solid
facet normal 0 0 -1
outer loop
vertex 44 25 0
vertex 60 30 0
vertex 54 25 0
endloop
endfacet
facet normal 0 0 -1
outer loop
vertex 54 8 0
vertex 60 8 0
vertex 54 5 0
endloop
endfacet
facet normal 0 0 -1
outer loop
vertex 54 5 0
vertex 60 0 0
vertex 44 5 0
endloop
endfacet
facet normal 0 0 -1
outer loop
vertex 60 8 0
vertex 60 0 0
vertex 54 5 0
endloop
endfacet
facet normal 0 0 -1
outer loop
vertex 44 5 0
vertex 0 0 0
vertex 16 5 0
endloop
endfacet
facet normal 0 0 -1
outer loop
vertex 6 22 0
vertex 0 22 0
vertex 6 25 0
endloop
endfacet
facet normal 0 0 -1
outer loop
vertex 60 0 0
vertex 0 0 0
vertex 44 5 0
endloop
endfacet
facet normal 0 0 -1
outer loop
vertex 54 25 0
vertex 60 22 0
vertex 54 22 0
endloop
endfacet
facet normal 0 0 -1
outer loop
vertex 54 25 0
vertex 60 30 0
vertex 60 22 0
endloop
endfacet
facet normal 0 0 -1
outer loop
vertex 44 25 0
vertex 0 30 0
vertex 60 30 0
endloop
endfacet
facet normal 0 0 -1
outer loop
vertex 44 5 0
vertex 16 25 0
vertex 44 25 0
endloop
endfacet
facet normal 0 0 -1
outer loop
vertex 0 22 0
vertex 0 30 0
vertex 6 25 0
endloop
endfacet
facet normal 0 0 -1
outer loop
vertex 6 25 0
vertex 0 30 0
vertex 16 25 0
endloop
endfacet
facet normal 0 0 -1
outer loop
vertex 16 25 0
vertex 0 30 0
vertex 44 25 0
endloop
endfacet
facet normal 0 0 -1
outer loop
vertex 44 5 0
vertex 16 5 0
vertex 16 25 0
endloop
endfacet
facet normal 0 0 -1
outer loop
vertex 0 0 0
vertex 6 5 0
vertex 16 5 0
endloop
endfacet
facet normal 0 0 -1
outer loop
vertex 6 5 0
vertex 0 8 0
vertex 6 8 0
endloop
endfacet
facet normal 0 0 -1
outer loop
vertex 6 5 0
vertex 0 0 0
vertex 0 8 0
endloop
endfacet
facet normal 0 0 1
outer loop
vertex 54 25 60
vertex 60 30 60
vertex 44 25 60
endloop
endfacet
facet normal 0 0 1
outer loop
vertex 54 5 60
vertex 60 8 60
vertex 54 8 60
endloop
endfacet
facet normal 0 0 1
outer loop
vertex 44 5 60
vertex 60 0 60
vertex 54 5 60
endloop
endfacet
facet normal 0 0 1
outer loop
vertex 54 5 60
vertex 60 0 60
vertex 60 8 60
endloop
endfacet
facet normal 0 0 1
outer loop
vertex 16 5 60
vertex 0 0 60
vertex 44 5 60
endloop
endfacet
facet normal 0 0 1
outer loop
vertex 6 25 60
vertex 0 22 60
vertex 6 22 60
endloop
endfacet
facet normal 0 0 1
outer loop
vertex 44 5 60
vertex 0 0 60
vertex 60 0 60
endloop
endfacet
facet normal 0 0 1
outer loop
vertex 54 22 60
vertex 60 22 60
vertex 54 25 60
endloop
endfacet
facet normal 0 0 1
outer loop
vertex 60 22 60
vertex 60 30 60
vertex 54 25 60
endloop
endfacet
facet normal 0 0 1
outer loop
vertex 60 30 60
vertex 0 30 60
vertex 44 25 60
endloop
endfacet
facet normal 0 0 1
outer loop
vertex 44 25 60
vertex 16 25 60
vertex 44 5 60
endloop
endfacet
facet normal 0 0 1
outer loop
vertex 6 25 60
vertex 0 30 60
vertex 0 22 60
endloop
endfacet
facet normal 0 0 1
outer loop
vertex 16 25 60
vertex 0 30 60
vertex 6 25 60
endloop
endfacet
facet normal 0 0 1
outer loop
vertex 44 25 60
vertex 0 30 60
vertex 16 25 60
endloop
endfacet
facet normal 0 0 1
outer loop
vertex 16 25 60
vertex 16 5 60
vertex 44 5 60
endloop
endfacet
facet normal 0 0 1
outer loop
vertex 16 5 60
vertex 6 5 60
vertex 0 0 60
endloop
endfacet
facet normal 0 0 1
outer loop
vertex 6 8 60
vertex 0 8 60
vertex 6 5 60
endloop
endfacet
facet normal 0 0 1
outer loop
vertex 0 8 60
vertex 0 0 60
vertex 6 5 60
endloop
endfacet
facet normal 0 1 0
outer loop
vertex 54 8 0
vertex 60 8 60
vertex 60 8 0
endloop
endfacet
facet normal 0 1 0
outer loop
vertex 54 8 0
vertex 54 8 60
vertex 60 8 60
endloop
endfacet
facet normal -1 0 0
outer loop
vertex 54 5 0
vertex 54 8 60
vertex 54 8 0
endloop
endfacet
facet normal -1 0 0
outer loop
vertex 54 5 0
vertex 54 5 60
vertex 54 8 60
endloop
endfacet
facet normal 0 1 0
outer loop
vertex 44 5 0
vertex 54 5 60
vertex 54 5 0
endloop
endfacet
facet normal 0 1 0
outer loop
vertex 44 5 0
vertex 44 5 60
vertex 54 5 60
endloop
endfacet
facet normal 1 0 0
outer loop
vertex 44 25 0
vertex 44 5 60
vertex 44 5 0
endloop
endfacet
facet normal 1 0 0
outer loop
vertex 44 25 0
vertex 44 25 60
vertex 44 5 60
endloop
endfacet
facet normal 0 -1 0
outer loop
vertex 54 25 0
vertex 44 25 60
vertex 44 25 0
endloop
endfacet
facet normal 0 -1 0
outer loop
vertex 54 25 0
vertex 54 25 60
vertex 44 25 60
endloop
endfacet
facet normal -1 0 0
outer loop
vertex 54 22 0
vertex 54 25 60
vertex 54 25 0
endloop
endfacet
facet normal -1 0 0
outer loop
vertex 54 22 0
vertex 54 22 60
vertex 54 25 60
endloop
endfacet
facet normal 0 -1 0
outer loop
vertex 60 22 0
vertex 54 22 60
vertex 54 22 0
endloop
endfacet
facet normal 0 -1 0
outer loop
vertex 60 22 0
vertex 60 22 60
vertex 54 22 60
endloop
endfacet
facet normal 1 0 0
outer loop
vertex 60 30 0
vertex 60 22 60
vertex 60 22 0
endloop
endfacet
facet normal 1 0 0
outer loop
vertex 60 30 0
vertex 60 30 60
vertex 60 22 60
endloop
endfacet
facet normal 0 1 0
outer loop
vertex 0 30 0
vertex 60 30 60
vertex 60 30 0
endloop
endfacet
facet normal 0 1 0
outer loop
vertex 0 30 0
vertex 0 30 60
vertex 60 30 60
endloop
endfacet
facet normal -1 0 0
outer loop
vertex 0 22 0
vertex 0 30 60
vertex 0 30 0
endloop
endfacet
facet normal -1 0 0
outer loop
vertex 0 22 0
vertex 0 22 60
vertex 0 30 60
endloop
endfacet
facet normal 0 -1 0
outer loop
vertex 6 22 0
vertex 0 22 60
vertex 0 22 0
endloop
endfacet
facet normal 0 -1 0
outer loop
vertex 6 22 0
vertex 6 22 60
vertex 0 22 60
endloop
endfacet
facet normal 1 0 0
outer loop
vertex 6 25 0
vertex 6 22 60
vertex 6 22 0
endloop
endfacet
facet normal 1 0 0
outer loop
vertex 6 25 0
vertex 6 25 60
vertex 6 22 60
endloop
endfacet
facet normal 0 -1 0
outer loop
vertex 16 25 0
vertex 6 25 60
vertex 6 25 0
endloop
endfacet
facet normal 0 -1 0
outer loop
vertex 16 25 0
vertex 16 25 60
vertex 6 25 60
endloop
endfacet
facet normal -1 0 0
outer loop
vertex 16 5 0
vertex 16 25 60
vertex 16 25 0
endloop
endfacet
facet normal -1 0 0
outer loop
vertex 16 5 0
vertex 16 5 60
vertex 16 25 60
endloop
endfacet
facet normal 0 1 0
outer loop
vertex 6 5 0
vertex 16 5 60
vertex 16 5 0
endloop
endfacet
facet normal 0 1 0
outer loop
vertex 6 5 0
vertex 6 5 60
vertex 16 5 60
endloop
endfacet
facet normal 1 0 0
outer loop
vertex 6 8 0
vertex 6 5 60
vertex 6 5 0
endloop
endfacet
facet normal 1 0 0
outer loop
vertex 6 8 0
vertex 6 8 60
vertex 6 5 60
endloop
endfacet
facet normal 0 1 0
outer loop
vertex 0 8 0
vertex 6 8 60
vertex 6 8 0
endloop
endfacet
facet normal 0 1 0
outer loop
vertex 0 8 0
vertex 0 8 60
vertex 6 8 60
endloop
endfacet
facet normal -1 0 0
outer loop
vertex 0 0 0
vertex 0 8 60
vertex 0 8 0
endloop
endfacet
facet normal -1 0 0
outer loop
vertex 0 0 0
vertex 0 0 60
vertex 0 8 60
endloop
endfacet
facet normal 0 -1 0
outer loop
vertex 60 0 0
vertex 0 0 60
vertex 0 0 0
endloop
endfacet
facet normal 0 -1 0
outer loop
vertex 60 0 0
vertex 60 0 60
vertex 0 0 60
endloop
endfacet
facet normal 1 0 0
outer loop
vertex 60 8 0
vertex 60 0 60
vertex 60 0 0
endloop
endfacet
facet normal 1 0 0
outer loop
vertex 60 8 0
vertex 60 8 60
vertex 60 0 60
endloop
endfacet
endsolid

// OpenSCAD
$fn = 32;

// ----------------------------------------------------------------------
// T-slot rail: 60 x 30 mm section, 60 mm long
// ----------------------------------------------------------------------

// --- parameters (mm) ---
profile_height = 60;      // extrusion height
profile_points = 20;      // points of the closed outline

profile = [[0, 0], [60, 0], [60, 8], [54, 8], [54, 5], [44, 5], [44, 25], [54, 25], [54, 22], [60, 22], [60, 30], [0, 30], [0, 22], [6, 22], [6, 25], [16, 25], [16, 5], [6, 5], [6, 8], [0, 8]];  // single closed polygon, 20 points, counter clockwise

// --- the one profile operation ---
linear_extrude(height = profile_height) polygon(points = profile);
